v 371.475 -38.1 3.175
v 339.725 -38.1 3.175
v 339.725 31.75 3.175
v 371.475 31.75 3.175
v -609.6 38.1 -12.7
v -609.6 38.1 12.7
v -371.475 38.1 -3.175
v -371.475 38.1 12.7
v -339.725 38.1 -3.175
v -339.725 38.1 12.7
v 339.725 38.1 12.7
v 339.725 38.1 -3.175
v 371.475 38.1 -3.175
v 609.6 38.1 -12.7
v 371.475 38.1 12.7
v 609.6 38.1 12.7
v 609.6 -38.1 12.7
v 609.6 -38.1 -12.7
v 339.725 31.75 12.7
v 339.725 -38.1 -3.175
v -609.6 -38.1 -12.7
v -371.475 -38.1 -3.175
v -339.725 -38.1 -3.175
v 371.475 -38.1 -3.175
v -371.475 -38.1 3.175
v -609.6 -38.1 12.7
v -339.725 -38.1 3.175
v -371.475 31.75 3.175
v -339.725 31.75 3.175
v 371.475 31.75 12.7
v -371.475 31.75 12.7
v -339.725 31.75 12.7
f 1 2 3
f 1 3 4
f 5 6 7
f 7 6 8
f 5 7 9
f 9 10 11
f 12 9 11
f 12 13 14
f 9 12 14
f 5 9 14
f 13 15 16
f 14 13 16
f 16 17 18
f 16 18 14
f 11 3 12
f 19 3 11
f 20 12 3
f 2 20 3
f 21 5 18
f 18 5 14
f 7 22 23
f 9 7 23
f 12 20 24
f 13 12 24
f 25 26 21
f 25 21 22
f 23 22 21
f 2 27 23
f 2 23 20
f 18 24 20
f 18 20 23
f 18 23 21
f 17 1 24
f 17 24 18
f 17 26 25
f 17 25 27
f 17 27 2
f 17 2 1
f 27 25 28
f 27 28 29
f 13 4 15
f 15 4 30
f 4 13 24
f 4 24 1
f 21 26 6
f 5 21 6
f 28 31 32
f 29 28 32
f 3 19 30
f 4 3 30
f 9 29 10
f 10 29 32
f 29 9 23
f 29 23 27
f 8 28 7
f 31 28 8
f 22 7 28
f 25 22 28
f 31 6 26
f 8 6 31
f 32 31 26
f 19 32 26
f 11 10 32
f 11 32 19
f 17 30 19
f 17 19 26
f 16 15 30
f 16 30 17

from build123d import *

# Parameters (mm, degrees)
F0_W     = 1219.2
F0_H     = 76.2
F1_DEPTH = 12.7
F2_W     = 31.75
F2_H     = 6.35
F3_DEPTH = 76.2
F4_DEPTH = 76.2
F5_W     = 31.75
F5_H     = 6.35
F6_DEPTH = 9.525
F7_DEPTH = 9.525


with BuildPart() as f1:
    # F0 (on Top) → F1 (new body, symmetric)
    with BuildSketch(Plane.XY):
        Rectangle(F0_W, F0_H)
    extrude(amount=F1_DEPTH, both=True)

    # F2 (on face) → F3 (cut, through all)
    with BuildSketch(Plane.XZ.offset(38.1)):
        with Locations((-355.6, 0)):
            Rectangle(F2_W, F2_H)
    extrude(amount=-F3_DEPTH, mode=Mode.SUBTRACT)

    # F2 (on face) → F4 (cut, through all)
    with BuildSketch(Plane.XZ.offset(38.1)):
        with Locations((355.6, 0)):
            Rectangle(F2_W, F2_H)
    extrude(amount=-F4_DEPTH, mode=Mode.SUBTRACT)

    # F5 (on face) → F6 (cut, through all)
    with BuildSketch(Plane.XY.offset(12.7)):
        with Locations((-355.6, 34.925)):
            Rectangle(F5_W, F5_H)
    extrude(amount=-F6_DEPTH, mode=Mode.SUBTRACT)

    # F5 (on face) → F7 (cut, through all)
    with BuildSketch(Plane.XY.offset(12.7)):
        with Locations((355.6, 34.925)):
            Rectangle(F5_W, F5_H)
    extrude(amount=-F7_DEPTH, mode=Mode.SUBTRACT)


solid = f1.part
